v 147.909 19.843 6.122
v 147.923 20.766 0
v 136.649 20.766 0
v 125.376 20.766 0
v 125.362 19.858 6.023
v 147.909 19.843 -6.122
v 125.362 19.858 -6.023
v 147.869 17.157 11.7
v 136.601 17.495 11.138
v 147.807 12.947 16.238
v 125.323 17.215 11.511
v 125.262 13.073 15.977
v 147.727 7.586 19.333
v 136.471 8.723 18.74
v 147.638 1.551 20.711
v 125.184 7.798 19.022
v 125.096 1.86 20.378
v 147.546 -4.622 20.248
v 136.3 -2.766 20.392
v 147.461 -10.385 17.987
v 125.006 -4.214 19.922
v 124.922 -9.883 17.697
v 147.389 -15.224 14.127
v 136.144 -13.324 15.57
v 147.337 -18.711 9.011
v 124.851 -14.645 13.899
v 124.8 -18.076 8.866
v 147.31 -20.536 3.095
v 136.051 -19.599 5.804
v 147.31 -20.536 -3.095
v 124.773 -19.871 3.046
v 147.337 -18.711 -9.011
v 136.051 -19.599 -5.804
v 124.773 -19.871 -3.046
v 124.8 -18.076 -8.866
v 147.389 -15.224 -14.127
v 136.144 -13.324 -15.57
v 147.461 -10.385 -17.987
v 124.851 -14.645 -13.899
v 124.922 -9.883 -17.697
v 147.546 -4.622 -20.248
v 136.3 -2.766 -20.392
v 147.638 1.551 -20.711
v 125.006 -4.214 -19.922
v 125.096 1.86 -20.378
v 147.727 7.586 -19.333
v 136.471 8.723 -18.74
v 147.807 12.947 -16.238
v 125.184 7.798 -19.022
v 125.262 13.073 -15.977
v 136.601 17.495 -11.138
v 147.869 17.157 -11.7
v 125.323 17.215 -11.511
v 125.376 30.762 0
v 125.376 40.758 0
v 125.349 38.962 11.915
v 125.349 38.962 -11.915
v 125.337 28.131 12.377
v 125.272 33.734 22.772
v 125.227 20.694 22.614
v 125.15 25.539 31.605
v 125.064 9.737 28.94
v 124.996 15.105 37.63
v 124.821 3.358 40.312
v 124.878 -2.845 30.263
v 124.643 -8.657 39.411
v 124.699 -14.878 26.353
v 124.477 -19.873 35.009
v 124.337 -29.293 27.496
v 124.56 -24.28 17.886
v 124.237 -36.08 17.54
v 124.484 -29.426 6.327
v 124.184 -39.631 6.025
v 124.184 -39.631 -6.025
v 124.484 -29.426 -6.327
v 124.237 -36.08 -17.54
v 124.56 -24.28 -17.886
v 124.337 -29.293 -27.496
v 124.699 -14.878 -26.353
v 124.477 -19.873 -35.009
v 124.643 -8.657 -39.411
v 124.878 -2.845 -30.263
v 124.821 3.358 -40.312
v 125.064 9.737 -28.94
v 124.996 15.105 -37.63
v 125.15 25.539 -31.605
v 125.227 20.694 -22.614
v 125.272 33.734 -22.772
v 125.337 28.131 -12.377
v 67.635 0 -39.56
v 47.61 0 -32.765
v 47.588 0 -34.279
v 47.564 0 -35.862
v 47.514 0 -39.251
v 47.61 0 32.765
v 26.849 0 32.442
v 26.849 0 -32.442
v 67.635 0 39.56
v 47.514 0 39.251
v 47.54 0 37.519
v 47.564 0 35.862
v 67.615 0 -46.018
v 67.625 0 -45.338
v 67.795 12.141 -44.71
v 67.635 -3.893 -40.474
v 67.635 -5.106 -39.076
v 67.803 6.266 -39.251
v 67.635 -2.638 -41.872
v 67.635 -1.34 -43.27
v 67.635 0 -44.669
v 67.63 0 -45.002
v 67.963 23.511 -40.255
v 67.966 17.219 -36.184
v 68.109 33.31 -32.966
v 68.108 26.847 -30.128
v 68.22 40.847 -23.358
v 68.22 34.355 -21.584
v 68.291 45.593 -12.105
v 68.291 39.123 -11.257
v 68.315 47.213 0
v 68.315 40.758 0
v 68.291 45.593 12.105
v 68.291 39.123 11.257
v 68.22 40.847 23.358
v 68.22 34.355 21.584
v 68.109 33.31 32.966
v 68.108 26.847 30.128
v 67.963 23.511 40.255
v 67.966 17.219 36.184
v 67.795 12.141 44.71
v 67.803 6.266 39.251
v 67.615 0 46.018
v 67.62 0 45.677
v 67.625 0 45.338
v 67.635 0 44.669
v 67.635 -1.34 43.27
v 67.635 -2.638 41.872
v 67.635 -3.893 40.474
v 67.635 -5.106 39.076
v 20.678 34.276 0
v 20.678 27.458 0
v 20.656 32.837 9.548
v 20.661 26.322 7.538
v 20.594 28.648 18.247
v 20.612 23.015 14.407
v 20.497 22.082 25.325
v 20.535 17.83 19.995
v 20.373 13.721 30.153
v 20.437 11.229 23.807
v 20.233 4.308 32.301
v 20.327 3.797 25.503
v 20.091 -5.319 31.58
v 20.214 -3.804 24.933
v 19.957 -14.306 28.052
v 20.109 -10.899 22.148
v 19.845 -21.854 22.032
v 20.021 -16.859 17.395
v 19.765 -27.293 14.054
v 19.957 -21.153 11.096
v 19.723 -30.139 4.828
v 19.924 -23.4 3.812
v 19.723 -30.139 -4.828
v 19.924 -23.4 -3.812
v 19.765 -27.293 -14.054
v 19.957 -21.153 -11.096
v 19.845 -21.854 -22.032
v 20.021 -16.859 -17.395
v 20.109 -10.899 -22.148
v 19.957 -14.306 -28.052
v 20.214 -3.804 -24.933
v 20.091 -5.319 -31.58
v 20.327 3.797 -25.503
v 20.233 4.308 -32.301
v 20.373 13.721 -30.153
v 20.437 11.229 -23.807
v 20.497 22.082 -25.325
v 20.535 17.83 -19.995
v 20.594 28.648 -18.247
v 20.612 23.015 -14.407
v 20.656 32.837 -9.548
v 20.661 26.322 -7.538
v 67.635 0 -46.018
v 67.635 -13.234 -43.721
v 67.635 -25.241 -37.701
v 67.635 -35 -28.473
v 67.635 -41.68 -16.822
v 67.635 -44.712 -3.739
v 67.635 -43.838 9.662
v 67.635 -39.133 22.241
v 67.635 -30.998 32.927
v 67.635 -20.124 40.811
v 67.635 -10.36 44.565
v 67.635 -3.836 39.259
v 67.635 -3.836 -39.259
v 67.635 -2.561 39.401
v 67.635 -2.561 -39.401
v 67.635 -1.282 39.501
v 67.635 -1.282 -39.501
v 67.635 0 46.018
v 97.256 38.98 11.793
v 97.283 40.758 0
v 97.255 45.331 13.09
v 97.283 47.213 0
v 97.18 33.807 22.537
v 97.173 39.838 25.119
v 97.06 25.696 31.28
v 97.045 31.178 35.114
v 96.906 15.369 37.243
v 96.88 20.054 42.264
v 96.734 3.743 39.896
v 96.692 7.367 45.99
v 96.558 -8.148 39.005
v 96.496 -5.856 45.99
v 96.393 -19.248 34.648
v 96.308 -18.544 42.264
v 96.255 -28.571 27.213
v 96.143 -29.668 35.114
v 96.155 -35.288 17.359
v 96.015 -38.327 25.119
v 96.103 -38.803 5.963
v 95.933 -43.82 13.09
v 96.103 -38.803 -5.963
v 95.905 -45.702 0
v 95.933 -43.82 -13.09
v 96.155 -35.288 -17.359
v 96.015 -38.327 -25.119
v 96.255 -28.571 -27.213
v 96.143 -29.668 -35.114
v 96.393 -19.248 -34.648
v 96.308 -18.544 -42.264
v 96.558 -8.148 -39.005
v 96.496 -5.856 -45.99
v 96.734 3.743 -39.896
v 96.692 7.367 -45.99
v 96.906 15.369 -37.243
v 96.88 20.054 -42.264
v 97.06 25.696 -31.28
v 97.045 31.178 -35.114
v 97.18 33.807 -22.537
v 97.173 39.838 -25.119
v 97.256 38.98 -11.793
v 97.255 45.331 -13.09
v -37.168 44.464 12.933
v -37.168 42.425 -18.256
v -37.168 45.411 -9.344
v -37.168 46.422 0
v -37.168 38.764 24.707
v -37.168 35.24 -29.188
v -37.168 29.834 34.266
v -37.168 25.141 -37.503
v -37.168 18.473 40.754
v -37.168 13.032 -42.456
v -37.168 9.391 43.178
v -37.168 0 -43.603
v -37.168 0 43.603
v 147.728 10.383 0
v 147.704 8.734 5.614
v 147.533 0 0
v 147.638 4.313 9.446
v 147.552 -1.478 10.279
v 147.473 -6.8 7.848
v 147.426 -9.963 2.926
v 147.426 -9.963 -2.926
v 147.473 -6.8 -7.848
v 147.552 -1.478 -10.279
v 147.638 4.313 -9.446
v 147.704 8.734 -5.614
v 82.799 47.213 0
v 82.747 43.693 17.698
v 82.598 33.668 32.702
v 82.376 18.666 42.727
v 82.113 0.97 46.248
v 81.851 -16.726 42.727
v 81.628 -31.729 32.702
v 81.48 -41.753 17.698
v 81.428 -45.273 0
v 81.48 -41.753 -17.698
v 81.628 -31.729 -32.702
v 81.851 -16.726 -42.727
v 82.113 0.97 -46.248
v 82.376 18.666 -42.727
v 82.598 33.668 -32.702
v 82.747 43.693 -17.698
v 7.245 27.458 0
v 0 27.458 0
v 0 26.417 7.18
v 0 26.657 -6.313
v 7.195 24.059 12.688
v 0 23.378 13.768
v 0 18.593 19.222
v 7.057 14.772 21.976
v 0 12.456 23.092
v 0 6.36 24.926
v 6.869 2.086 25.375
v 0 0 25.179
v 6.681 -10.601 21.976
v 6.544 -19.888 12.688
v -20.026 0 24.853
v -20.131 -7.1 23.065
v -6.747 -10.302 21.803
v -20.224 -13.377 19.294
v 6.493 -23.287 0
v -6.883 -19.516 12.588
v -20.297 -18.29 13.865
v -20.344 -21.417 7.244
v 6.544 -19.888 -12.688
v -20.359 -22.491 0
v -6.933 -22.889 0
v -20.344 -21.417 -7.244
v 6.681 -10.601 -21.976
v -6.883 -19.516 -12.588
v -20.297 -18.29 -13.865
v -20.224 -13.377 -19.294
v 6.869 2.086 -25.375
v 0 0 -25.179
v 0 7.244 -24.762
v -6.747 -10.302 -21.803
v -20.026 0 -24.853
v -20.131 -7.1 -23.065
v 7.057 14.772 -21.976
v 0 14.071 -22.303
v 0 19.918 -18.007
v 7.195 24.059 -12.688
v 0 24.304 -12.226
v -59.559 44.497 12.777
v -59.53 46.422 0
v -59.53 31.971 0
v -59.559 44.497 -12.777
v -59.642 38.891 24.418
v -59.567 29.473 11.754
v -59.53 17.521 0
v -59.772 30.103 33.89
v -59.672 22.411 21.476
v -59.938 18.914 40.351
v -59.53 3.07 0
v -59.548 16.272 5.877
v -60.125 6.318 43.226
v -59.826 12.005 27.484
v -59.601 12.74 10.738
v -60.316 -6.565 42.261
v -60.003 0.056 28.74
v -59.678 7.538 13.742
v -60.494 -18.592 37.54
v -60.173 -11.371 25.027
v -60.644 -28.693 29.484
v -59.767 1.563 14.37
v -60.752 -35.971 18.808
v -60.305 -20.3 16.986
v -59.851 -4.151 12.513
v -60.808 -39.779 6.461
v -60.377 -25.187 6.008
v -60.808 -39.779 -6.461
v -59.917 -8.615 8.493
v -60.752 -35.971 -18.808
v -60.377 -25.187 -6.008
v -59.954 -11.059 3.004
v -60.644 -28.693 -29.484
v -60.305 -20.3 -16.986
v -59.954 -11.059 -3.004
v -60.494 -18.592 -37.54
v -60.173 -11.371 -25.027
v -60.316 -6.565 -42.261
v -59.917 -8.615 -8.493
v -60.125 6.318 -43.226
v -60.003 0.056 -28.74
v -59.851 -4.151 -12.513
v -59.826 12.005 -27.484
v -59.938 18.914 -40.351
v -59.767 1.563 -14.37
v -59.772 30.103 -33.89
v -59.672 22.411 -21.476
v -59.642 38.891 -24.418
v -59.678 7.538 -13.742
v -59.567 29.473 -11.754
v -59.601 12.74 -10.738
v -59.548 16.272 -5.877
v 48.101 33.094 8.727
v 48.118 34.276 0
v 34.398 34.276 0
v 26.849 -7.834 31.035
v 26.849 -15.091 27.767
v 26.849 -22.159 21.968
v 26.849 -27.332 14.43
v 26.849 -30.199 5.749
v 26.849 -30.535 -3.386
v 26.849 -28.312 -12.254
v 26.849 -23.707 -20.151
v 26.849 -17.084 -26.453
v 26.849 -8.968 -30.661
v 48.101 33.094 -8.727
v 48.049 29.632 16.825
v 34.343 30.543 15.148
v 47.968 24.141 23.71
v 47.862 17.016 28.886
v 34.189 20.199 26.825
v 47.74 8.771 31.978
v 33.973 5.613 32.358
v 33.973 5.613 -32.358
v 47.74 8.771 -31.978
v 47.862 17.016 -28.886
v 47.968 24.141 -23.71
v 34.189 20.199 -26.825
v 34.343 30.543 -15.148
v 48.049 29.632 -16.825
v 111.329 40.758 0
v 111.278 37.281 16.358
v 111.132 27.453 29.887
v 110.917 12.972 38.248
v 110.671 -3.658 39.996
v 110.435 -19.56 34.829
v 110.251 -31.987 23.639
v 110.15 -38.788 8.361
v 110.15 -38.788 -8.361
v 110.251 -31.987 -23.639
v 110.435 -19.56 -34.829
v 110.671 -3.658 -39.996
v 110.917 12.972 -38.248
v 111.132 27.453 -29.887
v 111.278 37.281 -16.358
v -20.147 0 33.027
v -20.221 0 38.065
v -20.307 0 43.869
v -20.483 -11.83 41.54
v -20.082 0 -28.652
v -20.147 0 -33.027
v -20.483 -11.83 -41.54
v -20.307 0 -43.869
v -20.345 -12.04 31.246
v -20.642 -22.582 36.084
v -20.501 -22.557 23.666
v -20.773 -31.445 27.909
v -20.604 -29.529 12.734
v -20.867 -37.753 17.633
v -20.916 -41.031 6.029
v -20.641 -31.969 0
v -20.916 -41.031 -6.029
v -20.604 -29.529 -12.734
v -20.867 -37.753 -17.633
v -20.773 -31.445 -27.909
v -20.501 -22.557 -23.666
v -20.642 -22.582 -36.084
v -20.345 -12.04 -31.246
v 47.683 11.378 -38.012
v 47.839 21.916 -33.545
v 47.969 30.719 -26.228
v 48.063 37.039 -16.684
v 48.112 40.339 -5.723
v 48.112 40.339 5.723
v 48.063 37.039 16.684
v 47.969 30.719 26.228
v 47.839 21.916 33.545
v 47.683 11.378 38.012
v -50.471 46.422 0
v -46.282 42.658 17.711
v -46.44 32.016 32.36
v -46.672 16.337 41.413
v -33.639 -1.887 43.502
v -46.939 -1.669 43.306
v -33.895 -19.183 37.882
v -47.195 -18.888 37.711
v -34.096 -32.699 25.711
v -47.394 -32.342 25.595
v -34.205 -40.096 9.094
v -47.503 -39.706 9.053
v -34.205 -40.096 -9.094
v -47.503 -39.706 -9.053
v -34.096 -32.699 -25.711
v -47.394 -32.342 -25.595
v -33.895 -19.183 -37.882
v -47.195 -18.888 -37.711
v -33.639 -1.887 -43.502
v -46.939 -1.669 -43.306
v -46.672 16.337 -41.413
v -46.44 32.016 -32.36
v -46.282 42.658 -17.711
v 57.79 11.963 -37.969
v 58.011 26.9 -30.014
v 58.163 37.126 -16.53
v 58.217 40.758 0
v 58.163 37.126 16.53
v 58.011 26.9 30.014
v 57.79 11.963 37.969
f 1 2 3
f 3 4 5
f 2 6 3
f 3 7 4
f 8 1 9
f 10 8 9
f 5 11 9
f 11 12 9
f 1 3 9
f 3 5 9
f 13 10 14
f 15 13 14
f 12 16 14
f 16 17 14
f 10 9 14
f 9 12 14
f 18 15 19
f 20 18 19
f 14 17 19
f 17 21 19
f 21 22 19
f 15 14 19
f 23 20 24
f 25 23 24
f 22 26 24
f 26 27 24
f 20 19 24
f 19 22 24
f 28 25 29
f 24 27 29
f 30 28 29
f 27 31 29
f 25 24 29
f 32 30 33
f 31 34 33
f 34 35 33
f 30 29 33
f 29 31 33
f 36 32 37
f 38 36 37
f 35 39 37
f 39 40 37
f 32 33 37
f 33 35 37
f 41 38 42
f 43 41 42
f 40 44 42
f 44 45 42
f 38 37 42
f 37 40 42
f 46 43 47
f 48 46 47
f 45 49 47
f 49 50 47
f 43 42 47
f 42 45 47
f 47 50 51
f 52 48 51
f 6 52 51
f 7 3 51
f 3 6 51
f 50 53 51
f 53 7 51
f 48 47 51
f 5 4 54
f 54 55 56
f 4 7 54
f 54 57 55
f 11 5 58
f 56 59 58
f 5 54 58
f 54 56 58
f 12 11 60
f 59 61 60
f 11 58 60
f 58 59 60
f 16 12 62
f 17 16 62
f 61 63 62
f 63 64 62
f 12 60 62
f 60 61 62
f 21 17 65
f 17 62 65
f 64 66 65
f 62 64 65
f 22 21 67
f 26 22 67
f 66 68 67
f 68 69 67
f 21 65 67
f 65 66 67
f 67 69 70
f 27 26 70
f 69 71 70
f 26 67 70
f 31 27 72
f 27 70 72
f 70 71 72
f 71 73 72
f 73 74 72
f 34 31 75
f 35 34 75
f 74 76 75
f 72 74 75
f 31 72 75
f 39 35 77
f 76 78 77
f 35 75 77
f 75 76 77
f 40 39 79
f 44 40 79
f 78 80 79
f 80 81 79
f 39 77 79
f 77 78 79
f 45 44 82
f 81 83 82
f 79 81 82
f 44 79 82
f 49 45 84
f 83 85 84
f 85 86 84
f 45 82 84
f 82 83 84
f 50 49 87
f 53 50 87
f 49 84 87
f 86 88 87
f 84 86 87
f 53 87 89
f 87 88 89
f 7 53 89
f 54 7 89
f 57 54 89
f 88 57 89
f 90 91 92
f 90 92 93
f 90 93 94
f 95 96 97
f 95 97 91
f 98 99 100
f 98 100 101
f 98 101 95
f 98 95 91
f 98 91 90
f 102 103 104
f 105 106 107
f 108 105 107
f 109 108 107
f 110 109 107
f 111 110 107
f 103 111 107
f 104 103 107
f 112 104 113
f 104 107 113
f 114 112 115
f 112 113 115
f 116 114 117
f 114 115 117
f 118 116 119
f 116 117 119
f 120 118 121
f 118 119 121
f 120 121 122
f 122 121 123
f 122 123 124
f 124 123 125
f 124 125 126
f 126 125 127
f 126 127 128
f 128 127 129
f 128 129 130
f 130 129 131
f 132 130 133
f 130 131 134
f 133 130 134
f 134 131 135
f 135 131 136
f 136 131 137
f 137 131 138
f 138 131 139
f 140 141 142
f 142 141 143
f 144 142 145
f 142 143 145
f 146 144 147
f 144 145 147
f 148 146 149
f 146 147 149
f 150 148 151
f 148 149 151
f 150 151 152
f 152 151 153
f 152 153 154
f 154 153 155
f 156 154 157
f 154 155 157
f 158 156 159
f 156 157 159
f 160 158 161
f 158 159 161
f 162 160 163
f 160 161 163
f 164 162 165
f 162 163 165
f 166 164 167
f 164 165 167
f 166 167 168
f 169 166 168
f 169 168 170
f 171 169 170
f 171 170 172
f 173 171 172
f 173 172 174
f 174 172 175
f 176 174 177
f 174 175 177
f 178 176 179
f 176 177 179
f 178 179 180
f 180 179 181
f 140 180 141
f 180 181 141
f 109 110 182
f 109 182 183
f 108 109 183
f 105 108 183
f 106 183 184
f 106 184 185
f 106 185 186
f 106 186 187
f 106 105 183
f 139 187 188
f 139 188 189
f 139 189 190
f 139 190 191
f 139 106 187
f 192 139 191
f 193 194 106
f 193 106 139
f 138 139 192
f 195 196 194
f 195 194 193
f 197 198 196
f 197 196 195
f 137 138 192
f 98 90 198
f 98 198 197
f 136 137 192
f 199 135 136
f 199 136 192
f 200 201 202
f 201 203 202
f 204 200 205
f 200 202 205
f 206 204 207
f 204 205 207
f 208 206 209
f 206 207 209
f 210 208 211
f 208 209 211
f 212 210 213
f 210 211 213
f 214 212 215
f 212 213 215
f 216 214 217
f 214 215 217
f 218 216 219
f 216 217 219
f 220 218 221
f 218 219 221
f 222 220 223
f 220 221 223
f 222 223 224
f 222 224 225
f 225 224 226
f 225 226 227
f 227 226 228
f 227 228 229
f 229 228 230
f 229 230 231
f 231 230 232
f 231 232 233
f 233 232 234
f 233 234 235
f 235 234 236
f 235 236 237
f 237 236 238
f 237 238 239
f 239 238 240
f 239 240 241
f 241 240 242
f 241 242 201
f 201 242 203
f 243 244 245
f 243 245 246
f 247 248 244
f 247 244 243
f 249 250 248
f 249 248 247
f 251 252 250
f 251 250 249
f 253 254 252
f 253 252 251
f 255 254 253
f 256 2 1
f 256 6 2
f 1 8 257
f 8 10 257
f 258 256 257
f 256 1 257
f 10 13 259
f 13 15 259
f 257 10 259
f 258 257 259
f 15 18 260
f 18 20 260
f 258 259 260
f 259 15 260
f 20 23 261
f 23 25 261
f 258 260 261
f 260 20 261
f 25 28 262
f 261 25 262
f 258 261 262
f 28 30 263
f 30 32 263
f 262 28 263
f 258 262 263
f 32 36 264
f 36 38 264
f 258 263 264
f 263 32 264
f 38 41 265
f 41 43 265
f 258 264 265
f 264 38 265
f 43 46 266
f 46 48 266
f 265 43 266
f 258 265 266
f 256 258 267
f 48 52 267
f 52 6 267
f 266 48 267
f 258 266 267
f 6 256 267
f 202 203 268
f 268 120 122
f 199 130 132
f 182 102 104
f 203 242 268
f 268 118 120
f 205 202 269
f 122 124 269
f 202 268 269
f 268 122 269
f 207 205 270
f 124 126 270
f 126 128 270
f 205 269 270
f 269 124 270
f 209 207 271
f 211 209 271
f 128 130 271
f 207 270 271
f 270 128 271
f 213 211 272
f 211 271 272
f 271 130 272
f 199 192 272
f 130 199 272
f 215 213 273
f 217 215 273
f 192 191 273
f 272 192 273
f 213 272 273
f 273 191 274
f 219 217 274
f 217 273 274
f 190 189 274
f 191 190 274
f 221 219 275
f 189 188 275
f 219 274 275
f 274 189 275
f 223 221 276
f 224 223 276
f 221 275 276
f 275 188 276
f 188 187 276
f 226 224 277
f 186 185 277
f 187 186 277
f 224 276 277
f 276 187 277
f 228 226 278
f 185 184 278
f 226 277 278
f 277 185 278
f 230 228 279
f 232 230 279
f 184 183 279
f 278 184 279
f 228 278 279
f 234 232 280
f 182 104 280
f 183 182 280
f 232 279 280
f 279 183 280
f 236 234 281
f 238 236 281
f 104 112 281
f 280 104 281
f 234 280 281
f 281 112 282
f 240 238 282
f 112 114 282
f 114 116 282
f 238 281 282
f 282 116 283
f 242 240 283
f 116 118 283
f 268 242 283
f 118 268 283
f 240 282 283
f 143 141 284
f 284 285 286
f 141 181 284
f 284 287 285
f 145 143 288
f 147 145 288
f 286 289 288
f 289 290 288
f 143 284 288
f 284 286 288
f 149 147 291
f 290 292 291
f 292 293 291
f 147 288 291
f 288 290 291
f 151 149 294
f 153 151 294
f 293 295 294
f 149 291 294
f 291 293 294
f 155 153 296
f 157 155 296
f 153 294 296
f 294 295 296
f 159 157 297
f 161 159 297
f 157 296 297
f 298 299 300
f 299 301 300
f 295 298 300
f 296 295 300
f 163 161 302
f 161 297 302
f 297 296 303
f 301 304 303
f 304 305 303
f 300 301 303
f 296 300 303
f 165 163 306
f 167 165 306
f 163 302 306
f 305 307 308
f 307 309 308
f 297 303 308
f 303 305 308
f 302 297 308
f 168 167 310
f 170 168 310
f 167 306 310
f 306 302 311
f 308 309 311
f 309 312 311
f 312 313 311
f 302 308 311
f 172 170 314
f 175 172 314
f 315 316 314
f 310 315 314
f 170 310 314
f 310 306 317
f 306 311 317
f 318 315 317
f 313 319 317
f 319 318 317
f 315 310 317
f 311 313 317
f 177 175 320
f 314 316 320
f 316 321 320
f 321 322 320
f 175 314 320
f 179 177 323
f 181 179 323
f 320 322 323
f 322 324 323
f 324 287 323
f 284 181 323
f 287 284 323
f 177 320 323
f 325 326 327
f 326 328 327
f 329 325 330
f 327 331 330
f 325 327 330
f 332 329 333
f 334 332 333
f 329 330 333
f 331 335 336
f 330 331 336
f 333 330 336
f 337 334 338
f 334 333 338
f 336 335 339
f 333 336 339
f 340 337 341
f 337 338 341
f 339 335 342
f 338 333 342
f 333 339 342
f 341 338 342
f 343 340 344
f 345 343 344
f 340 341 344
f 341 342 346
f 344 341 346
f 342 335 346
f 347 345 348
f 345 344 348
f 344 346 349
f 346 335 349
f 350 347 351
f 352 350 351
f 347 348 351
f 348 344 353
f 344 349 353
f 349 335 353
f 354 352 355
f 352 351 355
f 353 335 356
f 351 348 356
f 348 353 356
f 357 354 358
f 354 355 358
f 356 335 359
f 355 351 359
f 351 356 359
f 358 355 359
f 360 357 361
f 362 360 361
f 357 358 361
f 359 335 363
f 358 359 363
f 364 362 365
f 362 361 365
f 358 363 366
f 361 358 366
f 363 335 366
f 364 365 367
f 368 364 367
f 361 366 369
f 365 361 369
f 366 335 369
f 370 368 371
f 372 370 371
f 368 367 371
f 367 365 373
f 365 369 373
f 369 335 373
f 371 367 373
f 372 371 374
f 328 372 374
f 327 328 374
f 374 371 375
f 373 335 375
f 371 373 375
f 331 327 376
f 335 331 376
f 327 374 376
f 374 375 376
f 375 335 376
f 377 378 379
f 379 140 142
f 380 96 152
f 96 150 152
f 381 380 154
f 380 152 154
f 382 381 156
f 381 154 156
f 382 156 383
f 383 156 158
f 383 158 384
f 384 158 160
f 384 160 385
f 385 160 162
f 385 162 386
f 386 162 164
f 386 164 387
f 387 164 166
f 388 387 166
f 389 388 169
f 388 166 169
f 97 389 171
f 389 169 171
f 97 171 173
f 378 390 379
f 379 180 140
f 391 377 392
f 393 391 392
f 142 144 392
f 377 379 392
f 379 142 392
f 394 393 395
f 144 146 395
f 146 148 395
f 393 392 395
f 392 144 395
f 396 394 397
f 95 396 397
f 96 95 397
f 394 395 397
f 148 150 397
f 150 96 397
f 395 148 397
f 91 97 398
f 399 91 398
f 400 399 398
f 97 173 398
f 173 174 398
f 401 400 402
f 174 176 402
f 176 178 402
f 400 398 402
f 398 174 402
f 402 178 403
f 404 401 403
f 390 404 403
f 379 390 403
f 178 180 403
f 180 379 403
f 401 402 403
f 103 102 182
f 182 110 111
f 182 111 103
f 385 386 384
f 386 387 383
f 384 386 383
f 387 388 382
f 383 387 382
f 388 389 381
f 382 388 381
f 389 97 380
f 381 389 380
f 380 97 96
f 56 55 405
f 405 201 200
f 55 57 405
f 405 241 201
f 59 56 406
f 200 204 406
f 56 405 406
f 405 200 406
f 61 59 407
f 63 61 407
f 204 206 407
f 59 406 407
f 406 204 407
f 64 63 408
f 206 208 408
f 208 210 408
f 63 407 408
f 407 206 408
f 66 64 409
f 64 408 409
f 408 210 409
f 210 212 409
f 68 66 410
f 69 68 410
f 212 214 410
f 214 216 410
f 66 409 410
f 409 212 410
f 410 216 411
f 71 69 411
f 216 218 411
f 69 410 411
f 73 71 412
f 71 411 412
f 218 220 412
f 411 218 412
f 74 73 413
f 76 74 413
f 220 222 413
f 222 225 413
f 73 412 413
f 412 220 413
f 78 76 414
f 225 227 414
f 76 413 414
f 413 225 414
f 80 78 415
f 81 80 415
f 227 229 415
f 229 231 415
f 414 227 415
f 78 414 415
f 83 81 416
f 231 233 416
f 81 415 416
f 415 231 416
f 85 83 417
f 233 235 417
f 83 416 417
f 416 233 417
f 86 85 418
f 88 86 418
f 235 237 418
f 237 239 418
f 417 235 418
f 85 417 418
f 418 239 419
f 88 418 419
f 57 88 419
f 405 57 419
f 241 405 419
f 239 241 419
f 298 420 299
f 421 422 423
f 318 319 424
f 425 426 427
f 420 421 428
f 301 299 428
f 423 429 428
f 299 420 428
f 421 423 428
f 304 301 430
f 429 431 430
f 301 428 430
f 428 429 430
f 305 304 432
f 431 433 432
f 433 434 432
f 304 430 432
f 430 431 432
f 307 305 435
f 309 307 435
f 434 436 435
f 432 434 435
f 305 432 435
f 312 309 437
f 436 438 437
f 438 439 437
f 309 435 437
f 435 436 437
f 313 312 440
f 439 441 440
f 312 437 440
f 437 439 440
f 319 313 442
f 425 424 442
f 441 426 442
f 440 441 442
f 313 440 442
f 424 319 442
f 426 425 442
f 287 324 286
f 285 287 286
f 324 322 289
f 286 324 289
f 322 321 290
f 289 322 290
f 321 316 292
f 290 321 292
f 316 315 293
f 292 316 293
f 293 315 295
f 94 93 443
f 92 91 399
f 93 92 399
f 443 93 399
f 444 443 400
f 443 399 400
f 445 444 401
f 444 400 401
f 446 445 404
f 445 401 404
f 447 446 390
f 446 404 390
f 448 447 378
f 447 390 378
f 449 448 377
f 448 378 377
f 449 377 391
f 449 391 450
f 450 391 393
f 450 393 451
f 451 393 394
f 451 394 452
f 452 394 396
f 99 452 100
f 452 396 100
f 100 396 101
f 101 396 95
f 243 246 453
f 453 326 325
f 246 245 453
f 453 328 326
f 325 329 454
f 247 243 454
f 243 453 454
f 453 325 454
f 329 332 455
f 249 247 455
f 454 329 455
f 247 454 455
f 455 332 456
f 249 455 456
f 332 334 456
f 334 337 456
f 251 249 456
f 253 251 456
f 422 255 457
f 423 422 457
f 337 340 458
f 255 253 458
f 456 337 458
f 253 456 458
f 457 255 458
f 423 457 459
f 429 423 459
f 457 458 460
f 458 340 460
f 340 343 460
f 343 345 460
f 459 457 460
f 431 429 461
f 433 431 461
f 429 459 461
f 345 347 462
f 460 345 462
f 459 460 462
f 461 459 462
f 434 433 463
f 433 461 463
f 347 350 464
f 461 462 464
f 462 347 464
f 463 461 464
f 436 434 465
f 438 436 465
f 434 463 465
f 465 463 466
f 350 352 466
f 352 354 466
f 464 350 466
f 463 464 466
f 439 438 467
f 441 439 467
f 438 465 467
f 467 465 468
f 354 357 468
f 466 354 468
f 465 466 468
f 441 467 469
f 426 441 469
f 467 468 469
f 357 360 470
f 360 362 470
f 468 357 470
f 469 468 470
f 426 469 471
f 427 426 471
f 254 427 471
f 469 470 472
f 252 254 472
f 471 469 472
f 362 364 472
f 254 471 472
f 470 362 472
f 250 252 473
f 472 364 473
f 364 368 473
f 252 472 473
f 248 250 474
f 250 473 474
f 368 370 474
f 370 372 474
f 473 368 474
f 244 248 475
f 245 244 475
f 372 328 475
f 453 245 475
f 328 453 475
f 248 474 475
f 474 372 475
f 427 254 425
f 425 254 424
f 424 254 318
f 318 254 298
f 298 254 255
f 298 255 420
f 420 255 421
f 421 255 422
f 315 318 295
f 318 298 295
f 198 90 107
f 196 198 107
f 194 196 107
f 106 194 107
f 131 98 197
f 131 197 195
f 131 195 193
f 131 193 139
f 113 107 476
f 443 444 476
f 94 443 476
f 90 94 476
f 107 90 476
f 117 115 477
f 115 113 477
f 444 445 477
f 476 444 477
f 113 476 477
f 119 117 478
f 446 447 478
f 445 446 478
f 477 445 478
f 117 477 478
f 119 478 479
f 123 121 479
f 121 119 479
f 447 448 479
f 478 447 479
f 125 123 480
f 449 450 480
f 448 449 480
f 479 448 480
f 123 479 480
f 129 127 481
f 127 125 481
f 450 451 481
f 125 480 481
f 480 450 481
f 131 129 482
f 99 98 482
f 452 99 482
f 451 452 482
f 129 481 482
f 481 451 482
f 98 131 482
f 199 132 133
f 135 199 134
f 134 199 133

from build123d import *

# Parameters (mm, degrees)
F2_W     = 37.1675528586
F2_H     = 166.4876639843
F3_DEPTH = 82.2
F4_W     = 40.7858882099
F4_H     = 148.783929646
F5_DEPTH = 98.6


with BuildPart() as f1:
    # F0 (on Top) → F1 (revolve)
    with BuildSketch(Plane.XY):
        Polygon((-19.6189273595, 46.4221443981), (-59.5299630911, 46.4221443981), (-59.5299630911, 3.069964936), (147.5333869457, 0), (147.9226052761, 20.7655709237), (125.3759115934, 20.7655709237), (125.3759115934, 40.7577455044), (97.2828418016, 40.7577455044), (97.2828418016, 47.2125634551), (68.3147385716, 47.2125634551), (68.3147385716, 40.7577455044), (48.1183305383, 40.7577455044), (48.1183305383, 34.2763438821), (20.6776820123, 34.2763438821), (20.6776820123, 27.4582132697), (-19.6189273595, 27.4582132697), align=None)
    revolve(axis=Axis((44.0017119273, 1.534982468, 0), (0.9998901098, -0.0148245818, 0)))

    # F2 (on Front) → F3 (cut)
    with BuildSketch(Plane.XZ):
        with Locations((-18.5837764293, 5.1509216428)):
            Rectangle(F2_W, F2_H)
    extrude(amount=-F3_DEPTH, mode=Mode.SUBTRACT)

    # F4 (on Front) → F5 (cut)
    with BuildSketch(Plane.XZ):
        with Locations((47.2418097779, -5.5372081697)):
            Rectangle(F4_W, F4_H)
    extrude(amount=F5_DEPTH, mode=Mode.SUBTRACT)


solid = f1.part
